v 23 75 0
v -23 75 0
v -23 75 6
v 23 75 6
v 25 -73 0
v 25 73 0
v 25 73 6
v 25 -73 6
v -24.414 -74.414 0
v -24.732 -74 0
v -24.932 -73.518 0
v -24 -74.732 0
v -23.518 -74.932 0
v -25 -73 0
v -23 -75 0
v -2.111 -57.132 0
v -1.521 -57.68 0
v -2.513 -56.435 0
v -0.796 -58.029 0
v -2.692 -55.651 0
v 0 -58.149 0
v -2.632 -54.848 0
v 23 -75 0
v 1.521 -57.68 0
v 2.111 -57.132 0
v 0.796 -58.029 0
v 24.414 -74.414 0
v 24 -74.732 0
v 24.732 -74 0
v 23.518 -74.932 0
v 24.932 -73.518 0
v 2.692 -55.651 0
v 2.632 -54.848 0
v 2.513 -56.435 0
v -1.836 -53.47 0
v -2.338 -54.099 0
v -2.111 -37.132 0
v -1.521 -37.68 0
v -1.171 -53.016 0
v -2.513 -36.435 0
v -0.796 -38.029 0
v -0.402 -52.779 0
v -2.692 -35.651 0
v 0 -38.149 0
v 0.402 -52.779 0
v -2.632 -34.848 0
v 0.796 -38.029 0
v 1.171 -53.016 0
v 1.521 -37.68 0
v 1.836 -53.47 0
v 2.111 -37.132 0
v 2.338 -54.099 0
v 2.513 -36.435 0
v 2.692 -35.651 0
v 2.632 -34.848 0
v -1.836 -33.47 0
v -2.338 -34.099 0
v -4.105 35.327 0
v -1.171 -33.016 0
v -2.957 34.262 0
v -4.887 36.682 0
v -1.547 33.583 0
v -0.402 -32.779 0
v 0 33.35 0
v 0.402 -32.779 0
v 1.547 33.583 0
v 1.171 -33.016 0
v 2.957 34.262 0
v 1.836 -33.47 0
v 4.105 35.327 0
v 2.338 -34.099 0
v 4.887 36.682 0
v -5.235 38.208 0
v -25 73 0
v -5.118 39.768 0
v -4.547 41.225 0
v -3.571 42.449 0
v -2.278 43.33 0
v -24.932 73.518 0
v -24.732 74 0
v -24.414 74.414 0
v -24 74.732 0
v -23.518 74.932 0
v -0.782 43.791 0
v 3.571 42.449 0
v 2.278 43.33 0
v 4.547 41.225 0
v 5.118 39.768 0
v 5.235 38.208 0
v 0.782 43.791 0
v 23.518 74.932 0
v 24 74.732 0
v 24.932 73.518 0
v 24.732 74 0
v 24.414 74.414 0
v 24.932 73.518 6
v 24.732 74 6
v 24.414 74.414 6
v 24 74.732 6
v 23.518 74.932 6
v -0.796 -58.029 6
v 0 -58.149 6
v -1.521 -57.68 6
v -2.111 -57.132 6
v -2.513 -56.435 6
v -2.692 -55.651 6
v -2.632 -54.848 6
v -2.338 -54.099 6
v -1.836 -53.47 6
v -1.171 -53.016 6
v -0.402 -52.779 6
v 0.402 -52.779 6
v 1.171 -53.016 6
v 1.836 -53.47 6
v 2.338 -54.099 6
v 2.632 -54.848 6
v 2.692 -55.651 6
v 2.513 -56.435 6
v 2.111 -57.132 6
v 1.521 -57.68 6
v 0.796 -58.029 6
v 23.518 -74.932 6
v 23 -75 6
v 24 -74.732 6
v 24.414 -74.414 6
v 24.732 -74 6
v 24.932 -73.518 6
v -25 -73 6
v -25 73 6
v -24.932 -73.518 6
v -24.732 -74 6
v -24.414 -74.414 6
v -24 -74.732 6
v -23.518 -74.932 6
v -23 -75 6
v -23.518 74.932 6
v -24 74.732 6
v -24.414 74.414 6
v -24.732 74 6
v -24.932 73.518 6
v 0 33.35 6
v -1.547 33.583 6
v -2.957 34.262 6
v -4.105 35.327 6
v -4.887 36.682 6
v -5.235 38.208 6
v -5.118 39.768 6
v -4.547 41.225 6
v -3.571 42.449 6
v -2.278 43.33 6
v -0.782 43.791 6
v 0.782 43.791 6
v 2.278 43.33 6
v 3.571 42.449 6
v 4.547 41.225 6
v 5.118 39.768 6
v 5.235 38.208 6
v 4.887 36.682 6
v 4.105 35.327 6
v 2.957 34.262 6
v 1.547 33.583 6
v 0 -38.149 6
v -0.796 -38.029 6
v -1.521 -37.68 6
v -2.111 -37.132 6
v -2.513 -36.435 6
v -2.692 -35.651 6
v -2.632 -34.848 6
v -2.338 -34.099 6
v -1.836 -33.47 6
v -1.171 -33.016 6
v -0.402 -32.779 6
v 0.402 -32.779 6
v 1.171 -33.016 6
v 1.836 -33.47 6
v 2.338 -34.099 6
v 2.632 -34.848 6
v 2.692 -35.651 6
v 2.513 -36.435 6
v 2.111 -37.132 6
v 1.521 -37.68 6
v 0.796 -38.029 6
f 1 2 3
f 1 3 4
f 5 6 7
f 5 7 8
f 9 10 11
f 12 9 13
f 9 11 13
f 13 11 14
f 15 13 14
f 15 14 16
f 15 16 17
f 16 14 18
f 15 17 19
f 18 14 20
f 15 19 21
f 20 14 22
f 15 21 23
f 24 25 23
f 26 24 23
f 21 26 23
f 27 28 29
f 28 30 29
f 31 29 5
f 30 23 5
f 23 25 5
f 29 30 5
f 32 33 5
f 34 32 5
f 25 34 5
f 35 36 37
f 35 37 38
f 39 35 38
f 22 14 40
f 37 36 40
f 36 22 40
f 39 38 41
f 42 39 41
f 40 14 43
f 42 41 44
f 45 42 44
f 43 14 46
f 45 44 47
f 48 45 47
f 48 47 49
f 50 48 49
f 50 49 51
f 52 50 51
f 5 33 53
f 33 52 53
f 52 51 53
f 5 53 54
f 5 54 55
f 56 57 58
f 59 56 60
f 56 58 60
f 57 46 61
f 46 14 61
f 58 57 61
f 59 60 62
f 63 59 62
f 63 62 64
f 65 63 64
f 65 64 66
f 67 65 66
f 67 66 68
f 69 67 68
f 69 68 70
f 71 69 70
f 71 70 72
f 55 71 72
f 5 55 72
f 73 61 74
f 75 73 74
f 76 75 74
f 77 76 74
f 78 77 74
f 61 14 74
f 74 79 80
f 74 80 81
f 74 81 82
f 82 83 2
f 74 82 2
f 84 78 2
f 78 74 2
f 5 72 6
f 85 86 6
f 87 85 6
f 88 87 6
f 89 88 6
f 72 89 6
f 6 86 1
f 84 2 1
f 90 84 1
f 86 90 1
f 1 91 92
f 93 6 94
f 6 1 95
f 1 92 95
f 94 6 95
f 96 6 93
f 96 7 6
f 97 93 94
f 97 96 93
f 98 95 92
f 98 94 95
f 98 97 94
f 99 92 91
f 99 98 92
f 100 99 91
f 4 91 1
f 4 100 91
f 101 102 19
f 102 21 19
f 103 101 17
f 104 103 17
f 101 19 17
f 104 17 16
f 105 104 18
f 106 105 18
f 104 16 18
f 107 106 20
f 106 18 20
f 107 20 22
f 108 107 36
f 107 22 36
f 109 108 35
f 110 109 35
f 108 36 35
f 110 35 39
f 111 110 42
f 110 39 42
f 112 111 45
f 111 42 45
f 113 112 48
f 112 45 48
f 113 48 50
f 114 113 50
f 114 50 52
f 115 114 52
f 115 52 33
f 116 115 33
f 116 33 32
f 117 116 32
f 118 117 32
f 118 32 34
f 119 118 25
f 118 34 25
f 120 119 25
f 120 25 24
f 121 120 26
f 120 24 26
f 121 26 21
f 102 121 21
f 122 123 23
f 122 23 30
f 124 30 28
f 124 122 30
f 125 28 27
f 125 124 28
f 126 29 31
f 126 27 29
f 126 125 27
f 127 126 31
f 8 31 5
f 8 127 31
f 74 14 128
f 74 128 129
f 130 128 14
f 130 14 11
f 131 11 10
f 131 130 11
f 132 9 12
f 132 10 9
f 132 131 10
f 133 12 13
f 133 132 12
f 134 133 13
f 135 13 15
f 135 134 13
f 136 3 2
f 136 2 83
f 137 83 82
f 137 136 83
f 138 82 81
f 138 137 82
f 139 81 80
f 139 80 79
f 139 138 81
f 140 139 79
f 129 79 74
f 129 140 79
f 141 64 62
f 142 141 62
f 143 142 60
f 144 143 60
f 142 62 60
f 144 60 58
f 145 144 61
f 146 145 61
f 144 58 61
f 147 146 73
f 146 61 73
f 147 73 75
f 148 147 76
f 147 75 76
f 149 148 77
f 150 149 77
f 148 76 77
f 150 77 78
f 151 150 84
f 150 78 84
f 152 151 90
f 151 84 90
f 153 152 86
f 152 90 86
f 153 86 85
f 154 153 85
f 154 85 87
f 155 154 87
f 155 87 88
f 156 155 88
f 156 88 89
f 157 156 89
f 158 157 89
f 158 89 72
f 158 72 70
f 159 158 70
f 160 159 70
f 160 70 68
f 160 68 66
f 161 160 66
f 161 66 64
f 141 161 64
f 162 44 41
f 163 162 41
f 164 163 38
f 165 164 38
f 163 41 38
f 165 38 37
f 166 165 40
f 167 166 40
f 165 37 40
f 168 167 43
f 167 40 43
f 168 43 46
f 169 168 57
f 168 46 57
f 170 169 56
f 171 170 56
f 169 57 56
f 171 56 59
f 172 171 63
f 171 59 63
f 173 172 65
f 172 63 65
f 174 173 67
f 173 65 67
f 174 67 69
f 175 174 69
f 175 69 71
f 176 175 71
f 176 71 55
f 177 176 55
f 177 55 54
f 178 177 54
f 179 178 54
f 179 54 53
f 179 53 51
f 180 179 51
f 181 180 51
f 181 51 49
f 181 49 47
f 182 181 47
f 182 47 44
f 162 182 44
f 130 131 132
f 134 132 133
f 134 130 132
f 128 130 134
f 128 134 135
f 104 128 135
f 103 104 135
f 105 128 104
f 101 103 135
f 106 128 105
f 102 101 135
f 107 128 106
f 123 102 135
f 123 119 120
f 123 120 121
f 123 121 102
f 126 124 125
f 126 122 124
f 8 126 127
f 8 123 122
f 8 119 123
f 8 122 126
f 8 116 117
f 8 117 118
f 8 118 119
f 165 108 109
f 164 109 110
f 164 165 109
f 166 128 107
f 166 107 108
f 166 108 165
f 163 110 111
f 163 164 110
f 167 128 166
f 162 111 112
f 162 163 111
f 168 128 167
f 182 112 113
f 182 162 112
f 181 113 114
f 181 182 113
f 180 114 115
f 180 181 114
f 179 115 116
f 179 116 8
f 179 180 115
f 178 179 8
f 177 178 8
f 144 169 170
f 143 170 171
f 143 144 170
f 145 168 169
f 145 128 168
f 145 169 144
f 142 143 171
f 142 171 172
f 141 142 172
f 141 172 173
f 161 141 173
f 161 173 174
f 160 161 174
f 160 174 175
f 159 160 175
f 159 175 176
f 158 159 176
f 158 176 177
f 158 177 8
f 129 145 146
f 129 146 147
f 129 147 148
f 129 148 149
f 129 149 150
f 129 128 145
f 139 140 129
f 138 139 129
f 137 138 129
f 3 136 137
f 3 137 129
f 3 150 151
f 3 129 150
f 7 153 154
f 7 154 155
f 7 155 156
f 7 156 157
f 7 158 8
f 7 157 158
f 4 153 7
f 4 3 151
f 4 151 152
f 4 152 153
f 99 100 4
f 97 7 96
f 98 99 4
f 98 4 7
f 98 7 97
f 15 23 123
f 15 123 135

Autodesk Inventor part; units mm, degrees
ref_plane "YZ Plane" through (0, 0, 0) normal (1, 0, 0) x (0, 1, 0)
ref_plane "XZ Plane" through (0, 0, 0) normal (0, 1, 0) x (-1, 0, 0)
ref_plane "XY Plane" through (0, 0, 0) normal (0, 0, 1) x (1, 0, 0)
sketch "Sketch2" plane through (0, 0, 0) normal (0, 0, 1) x (1, 0, 0)
  line L0 (-25, 75) -> (25, 75)
  line L1 (25, 75) -> (25, -75)
  line L2 (25, -75) -> (-25, -75)
  line L3 (-25, -75) -> (-25, 75)
  line L4 (-25, 75) -> (25, -75) construction
  line L5 (25, 75) -> (-25, -75) construction
  point P0 (0, 0)
  dimension "d0" = 50
  dimension "d1" = 150
extrude "Extrusion1" add sketch "Sketch2" along normal blind 6
fillet "Fillet1" radius 2 4 edges at (25, 75, 3) (-25, 75, 3) (25, -75, 3) (-25, -75, 3)
sketch "Sketch3" plane through (0, 0, 6) normal (0, 0, 1) x (1, 0, 0)
  line L0 (23, 75) -> (-23, 75) projected
  point P0 (0, 0)
  point P1 (0, 38.6)
  point P2 (0, 75)
  dimension "d5" = 36.4
hole "Hole1" at (0, 38.6, 6) direction (0, 0, -1) diameter 10.5 end through all
sketch "Sketch4" plane through (0, 0, 6) normal (0, 0, 1) x (1, 0, 0)
  line L0 (-23, -75) -> (23, -75) projected
  point P0 (0, 0)
  point P1 (0, -55.449)
  point P2 (0, -35.449)
  dimension "d13" = 20
  dimension "d14" = 39.551
hole "Hole2" at (0, -55.449, 6) at (0, -35.449, 6) direction (0, 0, -1) diameter 5.4 end through all
properties part number "Columna"
